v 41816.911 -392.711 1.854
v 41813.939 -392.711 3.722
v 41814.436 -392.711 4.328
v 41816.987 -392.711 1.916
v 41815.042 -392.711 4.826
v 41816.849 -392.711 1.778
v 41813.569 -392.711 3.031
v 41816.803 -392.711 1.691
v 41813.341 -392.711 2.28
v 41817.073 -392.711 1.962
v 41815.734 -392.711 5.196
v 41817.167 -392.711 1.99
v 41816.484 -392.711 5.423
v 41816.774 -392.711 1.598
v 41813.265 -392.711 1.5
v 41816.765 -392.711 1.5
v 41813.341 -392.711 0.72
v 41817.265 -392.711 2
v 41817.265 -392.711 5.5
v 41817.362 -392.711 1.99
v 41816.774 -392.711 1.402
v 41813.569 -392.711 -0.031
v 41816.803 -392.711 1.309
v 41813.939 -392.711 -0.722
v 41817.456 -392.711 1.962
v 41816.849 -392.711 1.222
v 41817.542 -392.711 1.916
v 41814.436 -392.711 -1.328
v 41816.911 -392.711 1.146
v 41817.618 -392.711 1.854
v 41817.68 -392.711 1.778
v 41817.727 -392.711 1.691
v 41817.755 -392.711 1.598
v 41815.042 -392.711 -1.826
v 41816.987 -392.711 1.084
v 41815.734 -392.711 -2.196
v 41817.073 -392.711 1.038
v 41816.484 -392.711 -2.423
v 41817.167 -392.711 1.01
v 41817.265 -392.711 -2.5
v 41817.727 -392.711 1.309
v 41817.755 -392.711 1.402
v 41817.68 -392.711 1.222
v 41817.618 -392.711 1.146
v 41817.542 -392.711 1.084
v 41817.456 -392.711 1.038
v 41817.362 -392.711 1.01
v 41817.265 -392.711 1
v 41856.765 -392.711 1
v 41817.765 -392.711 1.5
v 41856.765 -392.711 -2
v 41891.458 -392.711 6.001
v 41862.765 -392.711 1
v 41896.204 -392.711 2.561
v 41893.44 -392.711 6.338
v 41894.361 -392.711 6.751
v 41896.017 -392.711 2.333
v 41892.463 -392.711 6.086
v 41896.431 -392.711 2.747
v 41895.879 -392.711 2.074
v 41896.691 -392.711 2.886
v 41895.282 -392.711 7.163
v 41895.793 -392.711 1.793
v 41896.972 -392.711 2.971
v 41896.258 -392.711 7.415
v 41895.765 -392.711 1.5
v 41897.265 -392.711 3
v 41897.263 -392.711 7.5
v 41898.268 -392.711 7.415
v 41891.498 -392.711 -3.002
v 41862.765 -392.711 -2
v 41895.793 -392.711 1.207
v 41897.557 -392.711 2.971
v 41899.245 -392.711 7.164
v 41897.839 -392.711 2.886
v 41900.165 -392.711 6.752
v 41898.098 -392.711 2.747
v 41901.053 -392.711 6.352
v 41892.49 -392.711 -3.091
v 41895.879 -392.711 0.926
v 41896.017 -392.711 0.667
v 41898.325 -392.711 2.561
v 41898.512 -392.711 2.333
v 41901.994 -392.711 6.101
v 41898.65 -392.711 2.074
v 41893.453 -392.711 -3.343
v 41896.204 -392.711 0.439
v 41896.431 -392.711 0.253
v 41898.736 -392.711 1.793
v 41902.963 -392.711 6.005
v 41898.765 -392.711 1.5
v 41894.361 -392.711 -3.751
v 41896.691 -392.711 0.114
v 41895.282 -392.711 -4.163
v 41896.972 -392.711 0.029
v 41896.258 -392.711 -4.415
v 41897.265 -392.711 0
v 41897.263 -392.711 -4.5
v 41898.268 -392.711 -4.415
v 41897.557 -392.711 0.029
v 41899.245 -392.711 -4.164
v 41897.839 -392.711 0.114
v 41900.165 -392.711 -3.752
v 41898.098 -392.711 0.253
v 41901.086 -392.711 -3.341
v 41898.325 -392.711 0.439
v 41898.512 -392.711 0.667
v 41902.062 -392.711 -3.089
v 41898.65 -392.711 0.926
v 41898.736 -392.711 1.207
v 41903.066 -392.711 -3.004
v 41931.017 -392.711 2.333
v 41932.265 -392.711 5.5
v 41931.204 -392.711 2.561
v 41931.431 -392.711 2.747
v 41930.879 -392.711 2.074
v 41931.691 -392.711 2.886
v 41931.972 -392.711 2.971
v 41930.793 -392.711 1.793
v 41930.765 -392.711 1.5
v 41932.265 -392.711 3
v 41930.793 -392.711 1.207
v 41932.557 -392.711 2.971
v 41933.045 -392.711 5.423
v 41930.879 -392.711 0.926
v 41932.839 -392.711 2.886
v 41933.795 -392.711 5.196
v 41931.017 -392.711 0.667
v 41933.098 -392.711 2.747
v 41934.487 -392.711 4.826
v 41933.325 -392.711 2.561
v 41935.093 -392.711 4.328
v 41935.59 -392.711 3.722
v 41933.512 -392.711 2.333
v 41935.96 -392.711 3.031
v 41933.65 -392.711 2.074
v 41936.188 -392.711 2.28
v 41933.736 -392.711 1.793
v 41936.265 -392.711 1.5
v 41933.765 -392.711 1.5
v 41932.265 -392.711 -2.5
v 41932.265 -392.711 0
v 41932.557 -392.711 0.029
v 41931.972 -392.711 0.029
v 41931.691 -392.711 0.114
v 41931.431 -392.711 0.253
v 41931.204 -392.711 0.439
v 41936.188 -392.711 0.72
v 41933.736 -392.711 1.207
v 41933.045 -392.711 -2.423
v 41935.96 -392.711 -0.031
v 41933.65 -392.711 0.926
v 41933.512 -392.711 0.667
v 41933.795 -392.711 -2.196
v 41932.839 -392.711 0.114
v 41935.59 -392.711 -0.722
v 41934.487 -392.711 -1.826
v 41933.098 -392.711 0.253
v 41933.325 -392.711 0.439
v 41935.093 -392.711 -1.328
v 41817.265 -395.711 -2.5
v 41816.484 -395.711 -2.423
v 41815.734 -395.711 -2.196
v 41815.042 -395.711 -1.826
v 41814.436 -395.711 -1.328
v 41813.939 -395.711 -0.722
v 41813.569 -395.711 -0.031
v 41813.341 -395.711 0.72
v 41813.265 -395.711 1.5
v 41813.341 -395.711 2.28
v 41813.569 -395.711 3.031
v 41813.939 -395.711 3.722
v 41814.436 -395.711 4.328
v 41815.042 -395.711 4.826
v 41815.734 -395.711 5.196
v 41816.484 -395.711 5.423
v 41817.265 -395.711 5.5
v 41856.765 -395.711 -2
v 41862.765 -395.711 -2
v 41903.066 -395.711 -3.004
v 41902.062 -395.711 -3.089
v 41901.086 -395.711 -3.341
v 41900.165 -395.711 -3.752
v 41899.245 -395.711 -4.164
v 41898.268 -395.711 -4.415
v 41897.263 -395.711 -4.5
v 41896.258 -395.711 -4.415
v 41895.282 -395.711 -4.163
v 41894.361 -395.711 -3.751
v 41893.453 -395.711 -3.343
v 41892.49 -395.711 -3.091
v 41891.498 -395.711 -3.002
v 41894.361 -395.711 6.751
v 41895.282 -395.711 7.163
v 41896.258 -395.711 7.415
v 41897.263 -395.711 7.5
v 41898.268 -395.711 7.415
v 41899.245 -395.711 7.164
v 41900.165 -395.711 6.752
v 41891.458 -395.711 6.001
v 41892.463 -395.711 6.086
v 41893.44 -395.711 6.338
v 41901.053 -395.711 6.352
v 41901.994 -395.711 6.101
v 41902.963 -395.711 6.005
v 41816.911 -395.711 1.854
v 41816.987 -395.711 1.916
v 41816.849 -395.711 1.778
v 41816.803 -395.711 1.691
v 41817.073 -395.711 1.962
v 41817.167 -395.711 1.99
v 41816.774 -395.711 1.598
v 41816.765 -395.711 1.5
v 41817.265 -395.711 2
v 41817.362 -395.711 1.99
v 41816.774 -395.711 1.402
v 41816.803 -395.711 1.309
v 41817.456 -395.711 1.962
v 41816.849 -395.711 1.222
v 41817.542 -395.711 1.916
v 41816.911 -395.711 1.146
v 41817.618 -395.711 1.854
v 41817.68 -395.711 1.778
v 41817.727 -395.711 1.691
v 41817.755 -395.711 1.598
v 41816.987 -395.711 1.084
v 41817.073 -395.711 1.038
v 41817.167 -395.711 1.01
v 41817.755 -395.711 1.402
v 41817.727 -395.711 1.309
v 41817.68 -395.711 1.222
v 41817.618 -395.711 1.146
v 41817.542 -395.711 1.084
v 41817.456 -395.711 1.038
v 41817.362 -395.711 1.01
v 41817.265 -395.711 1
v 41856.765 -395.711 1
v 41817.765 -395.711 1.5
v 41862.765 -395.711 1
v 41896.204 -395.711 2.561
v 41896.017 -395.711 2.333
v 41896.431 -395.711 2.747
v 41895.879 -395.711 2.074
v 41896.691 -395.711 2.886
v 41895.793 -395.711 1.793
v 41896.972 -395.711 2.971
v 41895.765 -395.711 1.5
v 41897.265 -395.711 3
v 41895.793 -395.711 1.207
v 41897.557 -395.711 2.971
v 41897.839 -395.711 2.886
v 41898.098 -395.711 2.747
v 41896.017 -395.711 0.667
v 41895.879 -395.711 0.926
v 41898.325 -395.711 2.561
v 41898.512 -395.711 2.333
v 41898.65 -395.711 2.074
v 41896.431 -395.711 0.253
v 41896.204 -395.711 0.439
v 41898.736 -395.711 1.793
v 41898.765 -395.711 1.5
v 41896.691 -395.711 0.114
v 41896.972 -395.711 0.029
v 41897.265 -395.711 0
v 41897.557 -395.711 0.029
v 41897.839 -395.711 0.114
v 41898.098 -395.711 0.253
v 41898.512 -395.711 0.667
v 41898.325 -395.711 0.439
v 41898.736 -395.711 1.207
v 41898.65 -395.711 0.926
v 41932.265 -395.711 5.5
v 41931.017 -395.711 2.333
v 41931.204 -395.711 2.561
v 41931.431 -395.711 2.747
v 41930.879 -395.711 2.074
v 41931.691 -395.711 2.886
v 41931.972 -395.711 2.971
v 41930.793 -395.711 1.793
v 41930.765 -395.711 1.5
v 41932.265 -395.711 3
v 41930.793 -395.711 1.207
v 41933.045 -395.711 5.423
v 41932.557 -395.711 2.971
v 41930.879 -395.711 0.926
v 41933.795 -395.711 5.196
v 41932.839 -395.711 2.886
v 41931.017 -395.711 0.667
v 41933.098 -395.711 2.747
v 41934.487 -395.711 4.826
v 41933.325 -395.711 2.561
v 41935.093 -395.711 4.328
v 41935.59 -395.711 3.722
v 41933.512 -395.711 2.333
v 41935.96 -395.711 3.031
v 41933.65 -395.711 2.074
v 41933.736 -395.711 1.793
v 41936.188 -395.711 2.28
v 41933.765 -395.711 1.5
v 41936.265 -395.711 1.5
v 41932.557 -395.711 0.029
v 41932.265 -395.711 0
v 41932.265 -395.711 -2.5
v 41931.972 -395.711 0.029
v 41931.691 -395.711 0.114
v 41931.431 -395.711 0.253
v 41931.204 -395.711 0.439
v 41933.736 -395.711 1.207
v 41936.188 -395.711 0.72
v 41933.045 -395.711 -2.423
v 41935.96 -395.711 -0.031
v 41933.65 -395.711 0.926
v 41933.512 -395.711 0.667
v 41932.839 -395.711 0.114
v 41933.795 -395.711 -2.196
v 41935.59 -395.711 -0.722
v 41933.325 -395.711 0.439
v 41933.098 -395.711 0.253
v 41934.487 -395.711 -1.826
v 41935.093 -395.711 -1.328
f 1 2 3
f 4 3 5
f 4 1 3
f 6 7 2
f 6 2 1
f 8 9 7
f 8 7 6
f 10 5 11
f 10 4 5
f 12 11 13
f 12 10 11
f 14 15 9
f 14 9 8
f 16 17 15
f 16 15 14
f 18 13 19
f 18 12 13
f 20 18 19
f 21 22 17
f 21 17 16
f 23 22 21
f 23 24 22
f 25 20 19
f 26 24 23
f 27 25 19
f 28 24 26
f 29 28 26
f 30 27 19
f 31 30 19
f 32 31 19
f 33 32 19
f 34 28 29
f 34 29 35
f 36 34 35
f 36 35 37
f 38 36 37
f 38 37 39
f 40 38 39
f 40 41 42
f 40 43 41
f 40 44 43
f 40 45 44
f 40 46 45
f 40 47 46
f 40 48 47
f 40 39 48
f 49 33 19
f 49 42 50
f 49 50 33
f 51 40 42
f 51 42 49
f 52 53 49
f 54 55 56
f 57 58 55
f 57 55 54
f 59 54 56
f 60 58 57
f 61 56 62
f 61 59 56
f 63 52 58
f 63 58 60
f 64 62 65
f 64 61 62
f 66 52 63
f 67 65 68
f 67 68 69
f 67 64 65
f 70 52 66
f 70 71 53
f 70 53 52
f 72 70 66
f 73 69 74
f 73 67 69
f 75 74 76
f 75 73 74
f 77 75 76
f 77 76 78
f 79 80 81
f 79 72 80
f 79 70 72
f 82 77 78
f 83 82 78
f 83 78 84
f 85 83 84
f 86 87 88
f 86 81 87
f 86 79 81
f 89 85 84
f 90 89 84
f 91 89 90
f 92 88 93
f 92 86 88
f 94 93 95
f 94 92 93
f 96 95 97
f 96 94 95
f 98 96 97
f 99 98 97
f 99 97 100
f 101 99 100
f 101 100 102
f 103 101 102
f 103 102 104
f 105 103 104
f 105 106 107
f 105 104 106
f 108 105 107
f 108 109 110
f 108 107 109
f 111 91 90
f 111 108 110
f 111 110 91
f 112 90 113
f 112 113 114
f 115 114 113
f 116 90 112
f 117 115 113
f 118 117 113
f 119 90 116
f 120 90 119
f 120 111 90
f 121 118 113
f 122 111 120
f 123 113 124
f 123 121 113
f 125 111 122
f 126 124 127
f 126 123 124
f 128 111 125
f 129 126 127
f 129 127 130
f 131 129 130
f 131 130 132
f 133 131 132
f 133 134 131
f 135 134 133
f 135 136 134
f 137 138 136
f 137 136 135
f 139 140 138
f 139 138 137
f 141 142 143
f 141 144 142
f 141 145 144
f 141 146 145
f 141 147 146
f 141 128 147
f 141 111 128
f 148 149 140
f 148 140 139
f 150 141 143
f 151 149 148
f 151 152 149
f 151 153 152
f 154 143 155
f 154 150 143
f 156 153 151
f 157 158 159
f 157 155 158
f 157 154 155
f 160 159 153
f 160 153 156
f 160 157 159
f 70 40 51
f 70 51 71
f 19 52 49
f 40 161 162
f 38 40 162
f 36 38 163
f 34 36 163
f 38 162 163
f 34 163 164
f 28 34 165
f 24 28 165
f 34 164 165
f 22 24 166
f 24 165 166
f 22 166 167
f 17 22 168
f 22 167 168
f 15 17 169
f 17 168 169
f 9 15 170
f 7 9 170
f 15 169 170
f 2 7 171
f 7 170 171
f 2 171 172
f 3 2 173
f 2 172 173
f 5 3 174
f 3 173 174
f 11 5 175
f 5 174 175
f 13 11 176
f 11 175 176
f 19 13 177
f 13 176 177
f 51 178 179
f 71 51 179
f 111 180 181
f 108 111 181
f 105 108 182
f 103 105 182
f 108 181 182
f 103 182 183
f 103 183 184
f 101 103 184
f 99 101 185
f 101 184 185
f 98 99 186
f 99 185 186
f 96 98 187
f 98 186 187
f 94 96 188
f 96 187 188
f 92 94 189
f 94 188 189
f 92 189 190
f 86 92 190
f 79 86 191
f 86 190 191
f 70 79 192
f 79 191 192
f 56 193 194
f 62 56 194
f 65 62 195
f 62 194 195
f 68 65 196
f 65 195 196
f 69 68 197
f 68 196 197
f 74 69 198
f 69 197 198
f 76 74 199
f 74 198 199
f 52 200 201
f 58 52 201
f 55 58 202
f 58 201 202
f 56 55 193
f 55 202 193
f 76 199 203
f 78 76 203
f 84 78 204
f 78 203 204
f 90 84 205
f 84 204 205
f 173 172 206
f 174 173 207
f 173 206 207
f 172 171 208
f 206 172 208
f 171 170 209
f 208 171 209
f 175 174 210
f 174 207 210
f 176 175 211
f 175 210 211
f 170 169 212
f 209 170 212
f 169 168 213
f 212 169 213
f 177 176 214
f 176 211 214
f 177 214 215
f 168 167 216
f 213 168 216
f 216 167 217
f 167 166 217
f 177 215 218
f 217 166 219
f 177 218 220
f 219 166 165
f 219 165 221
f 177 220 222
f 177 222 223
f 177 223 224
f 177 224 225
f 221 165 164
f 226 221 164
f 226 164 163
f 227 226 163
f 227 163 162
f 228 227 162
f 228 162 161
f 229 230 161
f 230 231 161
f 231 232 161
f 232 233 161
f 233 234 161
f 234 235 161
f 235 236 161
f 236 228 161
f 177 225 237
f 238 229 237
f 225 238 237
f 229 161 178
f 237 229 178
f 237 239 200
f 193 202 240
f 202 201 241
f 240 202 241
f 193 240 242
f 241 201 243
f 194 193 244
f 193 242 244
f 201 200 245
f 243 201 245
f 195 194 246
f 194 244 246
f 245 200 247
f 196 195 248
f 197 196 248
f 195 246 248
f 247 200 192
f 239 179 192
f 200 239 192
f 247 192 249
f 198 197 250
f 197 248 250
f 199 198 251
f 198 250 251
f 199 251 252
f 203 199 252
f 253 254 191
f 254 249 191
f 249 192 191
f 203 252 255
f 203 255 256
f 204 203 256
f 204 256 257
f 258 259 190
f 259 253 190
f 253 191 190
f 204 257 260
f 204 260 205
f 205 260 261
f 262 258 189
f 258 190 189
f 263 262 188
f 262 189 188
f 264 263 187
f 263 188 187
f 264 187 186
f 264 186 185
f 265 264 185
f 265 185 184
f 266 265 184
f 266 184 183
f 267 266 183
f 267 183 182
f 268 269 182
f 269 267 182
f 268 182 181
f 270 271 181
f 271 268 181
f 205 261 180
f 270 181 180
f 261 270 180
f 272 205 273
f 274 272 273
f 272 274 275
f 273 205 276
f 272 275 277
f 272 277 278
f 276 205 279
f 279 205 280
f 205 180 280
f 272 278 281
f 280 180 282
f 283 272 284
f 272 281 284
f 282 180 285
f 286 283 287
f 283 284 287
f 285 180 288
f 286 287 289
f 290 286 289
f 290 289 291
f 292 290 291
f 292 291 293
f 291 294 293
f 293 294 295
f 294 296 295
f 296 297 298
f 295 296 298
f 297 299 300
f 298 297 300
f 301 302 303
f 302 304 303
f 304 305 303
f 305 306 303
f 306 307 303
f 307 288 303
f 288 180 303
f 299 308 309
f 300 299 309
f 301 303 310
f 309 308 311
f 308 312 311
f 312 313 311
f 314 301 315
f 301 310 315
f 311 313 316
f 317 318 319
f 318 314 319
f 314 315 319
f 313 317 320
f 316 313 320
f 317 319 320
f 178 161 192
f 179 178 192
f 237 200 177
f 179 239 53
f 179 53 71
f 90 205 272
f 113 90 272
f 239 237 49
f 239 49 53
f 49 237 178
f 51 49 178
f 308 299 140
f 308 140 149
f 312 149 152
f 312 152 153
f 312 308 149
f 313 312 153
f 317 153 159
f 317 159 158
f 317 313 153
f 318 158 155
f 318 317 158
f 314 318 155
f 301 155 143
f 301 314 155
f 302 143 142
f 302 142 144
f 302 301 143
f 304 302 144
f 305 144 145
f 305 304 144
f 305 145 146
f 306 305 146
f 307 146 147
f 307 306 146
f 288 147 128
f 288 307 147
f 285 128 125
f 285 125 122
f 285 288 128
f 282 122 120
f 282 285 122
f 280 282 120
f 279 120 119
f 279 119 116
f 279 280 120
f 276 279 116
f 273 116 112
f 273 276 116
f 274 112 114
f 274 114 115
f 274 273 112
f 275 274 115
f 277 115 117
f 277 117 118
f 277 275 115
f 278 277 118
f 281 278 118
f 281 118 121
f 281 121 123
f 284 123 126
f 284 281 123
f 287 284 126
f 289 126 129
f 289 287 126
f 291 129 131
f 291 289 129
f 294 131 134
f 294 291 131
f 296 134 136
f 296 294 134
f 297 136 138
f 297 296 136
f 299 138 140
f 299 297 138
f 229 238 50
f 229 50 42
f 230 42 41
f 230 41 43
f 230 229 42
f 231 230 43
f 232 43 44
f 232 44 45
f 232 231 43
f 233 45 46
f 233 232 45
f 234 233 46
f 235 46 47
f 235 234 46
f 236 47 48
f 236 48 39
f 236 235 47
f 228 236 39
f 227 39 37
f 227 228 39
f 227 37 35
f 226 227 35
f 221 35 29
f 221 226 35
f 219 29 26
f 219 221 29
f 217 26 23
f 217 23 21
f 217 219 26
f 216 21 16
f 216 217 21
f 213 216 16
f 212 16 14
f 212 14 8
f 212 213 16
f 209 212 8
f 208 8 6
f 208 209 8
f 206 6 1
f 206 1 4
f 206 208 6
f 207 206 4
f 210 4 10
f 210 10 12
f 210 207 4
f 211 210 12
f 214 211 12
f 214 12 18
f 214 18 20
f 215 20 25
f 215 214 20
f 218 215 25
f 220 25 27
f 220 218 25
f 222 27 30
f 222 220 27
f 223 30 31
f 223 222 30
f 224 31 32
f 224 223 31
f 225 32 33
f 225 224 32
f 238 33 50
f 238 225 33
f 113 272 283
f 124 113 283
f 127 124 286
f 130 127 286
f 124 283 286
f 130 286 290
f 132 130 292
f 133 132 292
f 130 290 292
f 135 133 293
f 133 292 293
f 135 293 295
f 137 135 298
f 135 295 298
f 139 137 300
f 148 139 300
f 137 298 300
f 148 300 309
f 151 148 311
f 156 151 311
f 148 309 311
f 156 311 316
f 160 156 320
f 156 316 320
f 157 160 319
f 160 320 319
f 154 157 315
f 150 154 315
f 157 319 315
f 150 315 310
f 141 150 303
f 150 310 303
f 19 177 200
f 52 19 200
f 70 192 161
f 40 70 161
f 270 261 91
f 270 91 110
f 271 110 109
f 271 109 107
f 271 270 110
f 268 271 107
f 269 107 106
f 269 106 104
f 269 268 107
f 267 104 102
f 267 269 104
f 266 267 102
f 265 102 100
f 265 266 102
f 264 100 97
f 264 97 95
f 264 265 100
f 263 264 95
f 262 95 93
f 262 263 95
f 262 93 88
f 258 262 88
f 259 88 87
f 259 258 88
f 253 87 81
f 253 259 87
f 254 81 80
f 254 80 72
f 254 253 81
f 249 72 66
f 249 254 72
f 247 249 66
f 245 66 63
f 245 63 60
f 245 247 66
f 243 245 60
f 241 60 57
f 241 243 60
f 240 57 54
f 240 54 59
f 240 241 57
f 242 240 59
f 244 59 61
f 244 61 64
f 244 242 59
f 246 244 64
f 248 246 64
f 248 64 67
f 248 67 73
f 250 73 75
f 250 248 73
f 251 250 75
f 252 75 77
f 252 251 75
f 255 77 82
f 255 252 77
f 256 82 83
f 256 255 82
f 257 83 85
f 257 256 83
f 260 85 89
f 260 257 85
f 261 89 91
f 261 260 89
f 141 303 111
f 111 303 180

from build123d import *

# Parameters (mm, degrees)
CROQUIS1_R                 = 0.5
CROQUIS1_R_2               = 1.5
CROQUIS1_W                 = 6
CROQUIS1_H                 = 3
SALIENTE_EXTRUIR1_DEPTH    = 3
S_LIDO_MOVER_COPIAR1_ANGLE = 90


with BuildPart() as part:
    # Croquis1 → Saliente-Extruir1 (new body)
    with BuildSketch(Plane.XY):
        with BuildLine():
            Line((41932.264601563, -390.210765183), (41903.066277894, -389.706454081))
            ThreePointArc((41903.066277894, -389.706454081), (41901.568434997, -389.516485634), (41900.165439728, -388.958609632))
            ThreePointArc((41900.165439728, -388.958609632), (41897.263118587, -388.210765367), (41894.361167478, -388.960044231))
            ThreePointArc((41894.361167478, -388.960044231), (41892.97663061, -389.513886246), (41891.498273009, -389.709186322))
            Line((41891.498273009, -389.709186322), (41817.264601562, -390.210765183))
            ThreePointArc((41817.264601562, -390.210765183), (41813.264601563, -394.210765183), (41817.264601563, -398.210765183))
            Line((41817.264601563, -398.210765183), (41891.457733394, -398.712207088))
            ThreePointArc((41891.457733394, -398.712207088), (41892.957012268, -398.902545922), (41894.361167478, -399.461486136))
            ThreePointArc((41894.361167478, -399.461486136), (41897.263118587, -400.210765), (41900.165439728, -399.462920735))
            ThreePointArc((41900.165439728, -399.462920735), (41901.518409746, -398.918171578), (41902.962844991, -398.715967883))
            Line((41902.962844991, -398.715967883), (41932.264601563, -398.210765183))
            ThreePointArc((41932.264601563, -398.210765183), (41936.264601563, -394.210765183), (41932.264601563, -390.210765183))
        make_face()
        with Locations((41817.264601563, -394.210765183)):
            Circle(CROQUIS1_R, mode=Mode.SUBTRACT)
        with Locations((41932.264601563, -394.210765183)):
            Circle(CROQUIS1_R_2, mode=Mode.SUBTRACT)
        with Locations((41897.264601563, -394.210765183)):
            Circle(CROQUIS1_R_2, mode=Mode.SUBTRACT)
        with Locations((41859.764601563, -392.210765183)):
            Rectangle(CROQUIS1_W, CROQUIS1_H, mode=Mode.SUBTRACT)
    extrude(amount=SALIENTE_EXTRUIR1_DEPTH)


with BuildPart() as part_1:
    # Sólido-Mover/Copiar1: moved
    add(part.part.rotate(Axis((0, -394.210765183, 1.5), (-1, 0, 0)), S_LIDO_MOVER_COPIAR1_ANGLE))


solid = part_1.part
